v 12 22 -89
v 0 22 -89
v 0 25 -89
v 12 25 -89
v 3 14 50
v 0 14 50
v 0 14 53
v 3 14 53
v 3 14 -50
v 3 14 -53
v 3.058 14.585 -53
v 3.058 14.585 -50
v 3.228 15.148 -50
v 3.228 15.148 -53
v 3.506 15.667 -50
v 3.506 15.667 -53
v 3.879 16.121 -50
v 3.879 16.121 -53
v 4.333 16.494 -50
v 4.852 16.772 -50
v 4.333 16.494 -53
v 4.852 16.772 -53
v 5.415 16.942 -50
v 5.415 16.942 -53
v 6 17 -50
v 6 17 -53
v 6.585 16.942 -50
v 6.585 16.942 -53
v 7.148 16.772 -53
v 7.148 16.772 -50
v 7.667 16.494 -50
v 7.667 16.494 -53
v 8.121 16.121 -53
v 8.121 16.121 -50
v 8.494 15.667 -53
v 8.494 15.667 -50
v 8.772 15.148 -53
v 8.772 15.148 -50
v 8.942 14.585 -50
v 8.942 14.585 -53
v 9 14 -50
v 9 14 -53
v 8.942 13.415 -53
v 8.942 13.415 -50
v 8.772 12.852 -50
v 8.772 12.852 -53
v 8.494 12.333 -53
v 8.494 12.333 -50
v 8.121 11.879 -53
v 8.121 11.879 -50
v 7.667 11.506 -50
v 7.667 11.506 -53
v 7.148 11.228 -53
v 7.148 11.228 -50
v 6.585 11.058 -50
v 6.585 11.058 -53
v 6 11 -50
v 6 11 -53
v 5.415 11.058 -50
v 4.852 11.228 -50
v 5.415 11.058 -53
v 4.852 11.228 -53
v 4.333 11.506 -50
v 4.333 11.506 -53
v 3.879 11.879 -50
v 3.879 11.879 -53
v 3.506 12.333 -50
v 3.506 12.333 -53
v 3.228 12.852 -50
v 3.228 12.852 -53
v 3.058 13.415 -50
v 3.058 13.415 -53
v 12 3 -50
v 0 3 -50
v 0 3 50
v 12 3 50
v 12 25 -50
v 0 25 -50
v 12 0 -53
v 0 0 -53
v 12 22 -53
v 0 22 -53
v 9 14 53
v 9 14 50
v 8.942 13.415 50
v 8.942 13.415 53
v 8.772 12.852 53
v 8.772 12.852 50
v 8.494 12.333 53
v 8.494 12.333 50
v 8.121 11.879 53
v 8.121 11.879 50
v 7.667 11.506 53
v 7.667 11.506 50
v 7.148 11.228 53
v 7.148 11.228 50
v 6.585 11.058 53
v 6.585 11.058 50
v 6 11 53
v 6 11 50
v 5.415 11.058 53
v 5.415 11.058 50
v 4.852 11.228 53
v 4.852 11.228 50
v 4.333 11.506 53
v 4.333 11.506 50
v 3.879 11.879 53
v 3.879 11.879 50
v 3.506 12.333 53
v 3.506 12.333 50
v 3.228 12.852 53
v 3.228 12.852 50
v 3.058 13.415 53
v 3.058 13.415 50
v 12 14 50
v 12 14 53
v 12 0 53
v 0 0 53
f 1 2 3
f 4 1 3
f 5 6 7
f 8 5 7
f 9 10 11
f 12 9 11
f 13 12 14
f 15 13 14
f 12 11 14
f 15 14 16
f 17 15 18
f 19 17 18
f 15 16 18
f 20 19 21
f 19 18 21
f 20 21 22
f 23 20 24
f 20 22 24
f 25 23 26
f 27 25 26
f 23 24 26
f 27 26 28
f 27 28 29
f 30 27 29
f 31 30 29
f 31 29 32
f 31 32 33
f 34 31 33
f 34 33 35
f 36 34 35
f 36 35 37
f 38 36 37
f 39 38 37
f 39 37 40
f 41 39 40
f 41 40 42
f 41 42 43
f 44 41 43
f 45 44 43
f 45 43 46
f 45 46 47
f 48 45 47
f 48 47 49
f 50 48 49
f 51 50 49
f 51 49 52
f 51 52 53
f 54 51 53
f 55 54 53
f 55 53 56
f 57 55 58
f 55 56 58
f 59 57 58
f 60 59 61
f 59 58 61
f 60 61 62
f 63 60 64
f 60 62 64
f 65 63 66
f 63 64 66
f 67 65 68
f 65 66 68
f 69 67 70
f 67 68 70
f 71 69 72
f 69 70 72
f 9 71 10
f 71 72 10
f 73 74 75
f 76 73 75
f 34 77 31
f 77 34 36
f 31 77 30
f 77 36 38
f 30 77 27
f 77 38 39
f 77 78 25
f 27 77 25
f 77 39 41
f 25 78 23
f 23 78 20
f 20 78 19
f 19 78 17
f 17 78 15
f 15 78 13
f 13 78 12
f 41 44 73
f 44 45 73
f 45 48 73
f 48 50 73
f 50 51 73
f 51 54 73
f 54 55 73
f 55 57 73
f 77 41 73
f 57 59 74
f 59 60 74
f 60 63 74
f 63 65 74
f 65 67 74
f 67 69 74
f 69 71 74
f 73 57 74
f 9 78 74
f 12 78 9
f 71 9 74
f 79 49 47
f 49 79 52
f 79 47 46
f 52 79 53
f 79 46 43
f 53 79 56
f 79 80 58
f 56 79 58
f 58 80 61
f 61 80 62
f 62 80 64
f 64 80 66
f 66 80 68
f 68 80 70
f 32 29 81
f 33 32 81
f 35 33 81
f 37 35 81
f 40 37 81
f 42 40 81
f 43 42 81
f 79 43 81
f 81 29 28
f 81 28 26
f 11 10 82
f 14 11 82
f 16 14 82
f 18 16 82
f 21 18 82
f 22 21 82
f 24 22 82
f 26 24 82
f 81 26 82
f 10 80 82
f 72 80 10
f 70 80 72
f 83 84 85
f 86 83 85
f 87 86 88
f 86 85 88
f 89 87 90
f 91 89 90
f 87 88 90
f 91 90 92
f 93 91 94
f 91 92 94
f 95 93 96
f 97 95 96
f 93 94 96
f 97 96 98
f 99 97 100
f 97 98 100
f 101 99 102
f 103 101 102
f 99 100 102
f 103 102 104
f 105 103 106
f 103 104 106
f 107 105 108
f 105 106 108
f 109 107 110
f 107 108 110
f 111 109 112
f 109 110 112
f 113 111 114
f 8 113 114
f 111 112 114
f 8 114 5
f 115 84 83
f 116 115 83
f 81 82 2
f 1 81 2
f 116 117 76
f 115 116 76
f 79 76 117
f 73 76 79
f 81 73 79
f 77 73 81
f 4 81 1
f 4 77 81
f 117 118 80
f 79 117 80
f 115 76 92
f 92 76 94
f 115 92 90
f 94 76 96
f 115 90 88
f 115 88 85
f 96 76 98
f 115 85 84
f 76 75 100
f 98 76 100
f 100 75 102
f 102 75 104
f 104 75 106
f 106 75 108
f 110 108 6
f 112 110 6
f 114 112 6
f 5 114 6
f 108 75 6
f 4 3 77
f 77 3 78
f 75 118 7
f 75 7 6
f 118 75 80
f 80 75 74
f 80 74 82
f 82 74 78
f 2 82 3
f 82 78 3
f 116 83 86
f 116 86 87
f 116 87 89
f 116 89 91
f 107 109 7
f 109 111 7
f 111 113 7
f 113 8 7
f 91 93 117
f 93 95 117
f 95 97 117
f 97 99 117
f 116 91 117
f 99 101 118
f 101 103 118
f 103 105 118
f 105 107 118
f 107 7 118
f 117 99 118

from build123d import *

# Parameters (mm, degrees)
EXTRUDE_1_DEPTH     = 12
CUT_EXTRUDE_1_REACH = 111.567
SKETCH_3_R          = 3


with BuildPart() as part:
    # 草图2 → 凸台-拉伸1 (new body)
    with BuildSketch(Plane(origin=(0, 0, 0), x_dir=(0, 0, -1), z_dir=(1, 0, 0))):
        Polygon((-53, 0), (53, 0), (53, 20), (53, 22), (89, 22), (89, 25), (50, 25), (50, 20), (50, 3), (-50, 3), (-50, 14), (-53, 14), align=None)
    extrude(amount=EXTRUDE_1_DEPTH)

    # 切除-拉伸1: up to this face of the body (flat: up to its plane)
    cut_extrude_1_end = Plane(part.part.faces().sort_by_distance((6, 7, 53))[0])
    # 草图3 → 切除-拉伸1 (cut, up to the picked face)
    with BuildSketch(Plane(origin=(0, 0, -53), x_dir=(-1, 0, 0), z_dir=(0, 0, -1)), mode=Mode.PRIVATE) as cut_extrude_1_sk1:
        with Locations((-6, 14)):
            Circle(SKETCH_3_R)
    cut_extrude_1_tool1 = split(extrude(cut_extrude_1_sk1.sketch, amount=-CUT_EXTRUDE_1_REACH, mode=Mode.PRIVATE), bisect_by=cut_extrude_1_end, keep=Keep.BOTH, mode=Mode.PRIVATE)
    add(cut_extrude_1_tool1.solids().sort_by(Axis((6, 14, -53), (0, 0, 1)))[0], mode=Mode.SUBTRACT)


solid = part.part
